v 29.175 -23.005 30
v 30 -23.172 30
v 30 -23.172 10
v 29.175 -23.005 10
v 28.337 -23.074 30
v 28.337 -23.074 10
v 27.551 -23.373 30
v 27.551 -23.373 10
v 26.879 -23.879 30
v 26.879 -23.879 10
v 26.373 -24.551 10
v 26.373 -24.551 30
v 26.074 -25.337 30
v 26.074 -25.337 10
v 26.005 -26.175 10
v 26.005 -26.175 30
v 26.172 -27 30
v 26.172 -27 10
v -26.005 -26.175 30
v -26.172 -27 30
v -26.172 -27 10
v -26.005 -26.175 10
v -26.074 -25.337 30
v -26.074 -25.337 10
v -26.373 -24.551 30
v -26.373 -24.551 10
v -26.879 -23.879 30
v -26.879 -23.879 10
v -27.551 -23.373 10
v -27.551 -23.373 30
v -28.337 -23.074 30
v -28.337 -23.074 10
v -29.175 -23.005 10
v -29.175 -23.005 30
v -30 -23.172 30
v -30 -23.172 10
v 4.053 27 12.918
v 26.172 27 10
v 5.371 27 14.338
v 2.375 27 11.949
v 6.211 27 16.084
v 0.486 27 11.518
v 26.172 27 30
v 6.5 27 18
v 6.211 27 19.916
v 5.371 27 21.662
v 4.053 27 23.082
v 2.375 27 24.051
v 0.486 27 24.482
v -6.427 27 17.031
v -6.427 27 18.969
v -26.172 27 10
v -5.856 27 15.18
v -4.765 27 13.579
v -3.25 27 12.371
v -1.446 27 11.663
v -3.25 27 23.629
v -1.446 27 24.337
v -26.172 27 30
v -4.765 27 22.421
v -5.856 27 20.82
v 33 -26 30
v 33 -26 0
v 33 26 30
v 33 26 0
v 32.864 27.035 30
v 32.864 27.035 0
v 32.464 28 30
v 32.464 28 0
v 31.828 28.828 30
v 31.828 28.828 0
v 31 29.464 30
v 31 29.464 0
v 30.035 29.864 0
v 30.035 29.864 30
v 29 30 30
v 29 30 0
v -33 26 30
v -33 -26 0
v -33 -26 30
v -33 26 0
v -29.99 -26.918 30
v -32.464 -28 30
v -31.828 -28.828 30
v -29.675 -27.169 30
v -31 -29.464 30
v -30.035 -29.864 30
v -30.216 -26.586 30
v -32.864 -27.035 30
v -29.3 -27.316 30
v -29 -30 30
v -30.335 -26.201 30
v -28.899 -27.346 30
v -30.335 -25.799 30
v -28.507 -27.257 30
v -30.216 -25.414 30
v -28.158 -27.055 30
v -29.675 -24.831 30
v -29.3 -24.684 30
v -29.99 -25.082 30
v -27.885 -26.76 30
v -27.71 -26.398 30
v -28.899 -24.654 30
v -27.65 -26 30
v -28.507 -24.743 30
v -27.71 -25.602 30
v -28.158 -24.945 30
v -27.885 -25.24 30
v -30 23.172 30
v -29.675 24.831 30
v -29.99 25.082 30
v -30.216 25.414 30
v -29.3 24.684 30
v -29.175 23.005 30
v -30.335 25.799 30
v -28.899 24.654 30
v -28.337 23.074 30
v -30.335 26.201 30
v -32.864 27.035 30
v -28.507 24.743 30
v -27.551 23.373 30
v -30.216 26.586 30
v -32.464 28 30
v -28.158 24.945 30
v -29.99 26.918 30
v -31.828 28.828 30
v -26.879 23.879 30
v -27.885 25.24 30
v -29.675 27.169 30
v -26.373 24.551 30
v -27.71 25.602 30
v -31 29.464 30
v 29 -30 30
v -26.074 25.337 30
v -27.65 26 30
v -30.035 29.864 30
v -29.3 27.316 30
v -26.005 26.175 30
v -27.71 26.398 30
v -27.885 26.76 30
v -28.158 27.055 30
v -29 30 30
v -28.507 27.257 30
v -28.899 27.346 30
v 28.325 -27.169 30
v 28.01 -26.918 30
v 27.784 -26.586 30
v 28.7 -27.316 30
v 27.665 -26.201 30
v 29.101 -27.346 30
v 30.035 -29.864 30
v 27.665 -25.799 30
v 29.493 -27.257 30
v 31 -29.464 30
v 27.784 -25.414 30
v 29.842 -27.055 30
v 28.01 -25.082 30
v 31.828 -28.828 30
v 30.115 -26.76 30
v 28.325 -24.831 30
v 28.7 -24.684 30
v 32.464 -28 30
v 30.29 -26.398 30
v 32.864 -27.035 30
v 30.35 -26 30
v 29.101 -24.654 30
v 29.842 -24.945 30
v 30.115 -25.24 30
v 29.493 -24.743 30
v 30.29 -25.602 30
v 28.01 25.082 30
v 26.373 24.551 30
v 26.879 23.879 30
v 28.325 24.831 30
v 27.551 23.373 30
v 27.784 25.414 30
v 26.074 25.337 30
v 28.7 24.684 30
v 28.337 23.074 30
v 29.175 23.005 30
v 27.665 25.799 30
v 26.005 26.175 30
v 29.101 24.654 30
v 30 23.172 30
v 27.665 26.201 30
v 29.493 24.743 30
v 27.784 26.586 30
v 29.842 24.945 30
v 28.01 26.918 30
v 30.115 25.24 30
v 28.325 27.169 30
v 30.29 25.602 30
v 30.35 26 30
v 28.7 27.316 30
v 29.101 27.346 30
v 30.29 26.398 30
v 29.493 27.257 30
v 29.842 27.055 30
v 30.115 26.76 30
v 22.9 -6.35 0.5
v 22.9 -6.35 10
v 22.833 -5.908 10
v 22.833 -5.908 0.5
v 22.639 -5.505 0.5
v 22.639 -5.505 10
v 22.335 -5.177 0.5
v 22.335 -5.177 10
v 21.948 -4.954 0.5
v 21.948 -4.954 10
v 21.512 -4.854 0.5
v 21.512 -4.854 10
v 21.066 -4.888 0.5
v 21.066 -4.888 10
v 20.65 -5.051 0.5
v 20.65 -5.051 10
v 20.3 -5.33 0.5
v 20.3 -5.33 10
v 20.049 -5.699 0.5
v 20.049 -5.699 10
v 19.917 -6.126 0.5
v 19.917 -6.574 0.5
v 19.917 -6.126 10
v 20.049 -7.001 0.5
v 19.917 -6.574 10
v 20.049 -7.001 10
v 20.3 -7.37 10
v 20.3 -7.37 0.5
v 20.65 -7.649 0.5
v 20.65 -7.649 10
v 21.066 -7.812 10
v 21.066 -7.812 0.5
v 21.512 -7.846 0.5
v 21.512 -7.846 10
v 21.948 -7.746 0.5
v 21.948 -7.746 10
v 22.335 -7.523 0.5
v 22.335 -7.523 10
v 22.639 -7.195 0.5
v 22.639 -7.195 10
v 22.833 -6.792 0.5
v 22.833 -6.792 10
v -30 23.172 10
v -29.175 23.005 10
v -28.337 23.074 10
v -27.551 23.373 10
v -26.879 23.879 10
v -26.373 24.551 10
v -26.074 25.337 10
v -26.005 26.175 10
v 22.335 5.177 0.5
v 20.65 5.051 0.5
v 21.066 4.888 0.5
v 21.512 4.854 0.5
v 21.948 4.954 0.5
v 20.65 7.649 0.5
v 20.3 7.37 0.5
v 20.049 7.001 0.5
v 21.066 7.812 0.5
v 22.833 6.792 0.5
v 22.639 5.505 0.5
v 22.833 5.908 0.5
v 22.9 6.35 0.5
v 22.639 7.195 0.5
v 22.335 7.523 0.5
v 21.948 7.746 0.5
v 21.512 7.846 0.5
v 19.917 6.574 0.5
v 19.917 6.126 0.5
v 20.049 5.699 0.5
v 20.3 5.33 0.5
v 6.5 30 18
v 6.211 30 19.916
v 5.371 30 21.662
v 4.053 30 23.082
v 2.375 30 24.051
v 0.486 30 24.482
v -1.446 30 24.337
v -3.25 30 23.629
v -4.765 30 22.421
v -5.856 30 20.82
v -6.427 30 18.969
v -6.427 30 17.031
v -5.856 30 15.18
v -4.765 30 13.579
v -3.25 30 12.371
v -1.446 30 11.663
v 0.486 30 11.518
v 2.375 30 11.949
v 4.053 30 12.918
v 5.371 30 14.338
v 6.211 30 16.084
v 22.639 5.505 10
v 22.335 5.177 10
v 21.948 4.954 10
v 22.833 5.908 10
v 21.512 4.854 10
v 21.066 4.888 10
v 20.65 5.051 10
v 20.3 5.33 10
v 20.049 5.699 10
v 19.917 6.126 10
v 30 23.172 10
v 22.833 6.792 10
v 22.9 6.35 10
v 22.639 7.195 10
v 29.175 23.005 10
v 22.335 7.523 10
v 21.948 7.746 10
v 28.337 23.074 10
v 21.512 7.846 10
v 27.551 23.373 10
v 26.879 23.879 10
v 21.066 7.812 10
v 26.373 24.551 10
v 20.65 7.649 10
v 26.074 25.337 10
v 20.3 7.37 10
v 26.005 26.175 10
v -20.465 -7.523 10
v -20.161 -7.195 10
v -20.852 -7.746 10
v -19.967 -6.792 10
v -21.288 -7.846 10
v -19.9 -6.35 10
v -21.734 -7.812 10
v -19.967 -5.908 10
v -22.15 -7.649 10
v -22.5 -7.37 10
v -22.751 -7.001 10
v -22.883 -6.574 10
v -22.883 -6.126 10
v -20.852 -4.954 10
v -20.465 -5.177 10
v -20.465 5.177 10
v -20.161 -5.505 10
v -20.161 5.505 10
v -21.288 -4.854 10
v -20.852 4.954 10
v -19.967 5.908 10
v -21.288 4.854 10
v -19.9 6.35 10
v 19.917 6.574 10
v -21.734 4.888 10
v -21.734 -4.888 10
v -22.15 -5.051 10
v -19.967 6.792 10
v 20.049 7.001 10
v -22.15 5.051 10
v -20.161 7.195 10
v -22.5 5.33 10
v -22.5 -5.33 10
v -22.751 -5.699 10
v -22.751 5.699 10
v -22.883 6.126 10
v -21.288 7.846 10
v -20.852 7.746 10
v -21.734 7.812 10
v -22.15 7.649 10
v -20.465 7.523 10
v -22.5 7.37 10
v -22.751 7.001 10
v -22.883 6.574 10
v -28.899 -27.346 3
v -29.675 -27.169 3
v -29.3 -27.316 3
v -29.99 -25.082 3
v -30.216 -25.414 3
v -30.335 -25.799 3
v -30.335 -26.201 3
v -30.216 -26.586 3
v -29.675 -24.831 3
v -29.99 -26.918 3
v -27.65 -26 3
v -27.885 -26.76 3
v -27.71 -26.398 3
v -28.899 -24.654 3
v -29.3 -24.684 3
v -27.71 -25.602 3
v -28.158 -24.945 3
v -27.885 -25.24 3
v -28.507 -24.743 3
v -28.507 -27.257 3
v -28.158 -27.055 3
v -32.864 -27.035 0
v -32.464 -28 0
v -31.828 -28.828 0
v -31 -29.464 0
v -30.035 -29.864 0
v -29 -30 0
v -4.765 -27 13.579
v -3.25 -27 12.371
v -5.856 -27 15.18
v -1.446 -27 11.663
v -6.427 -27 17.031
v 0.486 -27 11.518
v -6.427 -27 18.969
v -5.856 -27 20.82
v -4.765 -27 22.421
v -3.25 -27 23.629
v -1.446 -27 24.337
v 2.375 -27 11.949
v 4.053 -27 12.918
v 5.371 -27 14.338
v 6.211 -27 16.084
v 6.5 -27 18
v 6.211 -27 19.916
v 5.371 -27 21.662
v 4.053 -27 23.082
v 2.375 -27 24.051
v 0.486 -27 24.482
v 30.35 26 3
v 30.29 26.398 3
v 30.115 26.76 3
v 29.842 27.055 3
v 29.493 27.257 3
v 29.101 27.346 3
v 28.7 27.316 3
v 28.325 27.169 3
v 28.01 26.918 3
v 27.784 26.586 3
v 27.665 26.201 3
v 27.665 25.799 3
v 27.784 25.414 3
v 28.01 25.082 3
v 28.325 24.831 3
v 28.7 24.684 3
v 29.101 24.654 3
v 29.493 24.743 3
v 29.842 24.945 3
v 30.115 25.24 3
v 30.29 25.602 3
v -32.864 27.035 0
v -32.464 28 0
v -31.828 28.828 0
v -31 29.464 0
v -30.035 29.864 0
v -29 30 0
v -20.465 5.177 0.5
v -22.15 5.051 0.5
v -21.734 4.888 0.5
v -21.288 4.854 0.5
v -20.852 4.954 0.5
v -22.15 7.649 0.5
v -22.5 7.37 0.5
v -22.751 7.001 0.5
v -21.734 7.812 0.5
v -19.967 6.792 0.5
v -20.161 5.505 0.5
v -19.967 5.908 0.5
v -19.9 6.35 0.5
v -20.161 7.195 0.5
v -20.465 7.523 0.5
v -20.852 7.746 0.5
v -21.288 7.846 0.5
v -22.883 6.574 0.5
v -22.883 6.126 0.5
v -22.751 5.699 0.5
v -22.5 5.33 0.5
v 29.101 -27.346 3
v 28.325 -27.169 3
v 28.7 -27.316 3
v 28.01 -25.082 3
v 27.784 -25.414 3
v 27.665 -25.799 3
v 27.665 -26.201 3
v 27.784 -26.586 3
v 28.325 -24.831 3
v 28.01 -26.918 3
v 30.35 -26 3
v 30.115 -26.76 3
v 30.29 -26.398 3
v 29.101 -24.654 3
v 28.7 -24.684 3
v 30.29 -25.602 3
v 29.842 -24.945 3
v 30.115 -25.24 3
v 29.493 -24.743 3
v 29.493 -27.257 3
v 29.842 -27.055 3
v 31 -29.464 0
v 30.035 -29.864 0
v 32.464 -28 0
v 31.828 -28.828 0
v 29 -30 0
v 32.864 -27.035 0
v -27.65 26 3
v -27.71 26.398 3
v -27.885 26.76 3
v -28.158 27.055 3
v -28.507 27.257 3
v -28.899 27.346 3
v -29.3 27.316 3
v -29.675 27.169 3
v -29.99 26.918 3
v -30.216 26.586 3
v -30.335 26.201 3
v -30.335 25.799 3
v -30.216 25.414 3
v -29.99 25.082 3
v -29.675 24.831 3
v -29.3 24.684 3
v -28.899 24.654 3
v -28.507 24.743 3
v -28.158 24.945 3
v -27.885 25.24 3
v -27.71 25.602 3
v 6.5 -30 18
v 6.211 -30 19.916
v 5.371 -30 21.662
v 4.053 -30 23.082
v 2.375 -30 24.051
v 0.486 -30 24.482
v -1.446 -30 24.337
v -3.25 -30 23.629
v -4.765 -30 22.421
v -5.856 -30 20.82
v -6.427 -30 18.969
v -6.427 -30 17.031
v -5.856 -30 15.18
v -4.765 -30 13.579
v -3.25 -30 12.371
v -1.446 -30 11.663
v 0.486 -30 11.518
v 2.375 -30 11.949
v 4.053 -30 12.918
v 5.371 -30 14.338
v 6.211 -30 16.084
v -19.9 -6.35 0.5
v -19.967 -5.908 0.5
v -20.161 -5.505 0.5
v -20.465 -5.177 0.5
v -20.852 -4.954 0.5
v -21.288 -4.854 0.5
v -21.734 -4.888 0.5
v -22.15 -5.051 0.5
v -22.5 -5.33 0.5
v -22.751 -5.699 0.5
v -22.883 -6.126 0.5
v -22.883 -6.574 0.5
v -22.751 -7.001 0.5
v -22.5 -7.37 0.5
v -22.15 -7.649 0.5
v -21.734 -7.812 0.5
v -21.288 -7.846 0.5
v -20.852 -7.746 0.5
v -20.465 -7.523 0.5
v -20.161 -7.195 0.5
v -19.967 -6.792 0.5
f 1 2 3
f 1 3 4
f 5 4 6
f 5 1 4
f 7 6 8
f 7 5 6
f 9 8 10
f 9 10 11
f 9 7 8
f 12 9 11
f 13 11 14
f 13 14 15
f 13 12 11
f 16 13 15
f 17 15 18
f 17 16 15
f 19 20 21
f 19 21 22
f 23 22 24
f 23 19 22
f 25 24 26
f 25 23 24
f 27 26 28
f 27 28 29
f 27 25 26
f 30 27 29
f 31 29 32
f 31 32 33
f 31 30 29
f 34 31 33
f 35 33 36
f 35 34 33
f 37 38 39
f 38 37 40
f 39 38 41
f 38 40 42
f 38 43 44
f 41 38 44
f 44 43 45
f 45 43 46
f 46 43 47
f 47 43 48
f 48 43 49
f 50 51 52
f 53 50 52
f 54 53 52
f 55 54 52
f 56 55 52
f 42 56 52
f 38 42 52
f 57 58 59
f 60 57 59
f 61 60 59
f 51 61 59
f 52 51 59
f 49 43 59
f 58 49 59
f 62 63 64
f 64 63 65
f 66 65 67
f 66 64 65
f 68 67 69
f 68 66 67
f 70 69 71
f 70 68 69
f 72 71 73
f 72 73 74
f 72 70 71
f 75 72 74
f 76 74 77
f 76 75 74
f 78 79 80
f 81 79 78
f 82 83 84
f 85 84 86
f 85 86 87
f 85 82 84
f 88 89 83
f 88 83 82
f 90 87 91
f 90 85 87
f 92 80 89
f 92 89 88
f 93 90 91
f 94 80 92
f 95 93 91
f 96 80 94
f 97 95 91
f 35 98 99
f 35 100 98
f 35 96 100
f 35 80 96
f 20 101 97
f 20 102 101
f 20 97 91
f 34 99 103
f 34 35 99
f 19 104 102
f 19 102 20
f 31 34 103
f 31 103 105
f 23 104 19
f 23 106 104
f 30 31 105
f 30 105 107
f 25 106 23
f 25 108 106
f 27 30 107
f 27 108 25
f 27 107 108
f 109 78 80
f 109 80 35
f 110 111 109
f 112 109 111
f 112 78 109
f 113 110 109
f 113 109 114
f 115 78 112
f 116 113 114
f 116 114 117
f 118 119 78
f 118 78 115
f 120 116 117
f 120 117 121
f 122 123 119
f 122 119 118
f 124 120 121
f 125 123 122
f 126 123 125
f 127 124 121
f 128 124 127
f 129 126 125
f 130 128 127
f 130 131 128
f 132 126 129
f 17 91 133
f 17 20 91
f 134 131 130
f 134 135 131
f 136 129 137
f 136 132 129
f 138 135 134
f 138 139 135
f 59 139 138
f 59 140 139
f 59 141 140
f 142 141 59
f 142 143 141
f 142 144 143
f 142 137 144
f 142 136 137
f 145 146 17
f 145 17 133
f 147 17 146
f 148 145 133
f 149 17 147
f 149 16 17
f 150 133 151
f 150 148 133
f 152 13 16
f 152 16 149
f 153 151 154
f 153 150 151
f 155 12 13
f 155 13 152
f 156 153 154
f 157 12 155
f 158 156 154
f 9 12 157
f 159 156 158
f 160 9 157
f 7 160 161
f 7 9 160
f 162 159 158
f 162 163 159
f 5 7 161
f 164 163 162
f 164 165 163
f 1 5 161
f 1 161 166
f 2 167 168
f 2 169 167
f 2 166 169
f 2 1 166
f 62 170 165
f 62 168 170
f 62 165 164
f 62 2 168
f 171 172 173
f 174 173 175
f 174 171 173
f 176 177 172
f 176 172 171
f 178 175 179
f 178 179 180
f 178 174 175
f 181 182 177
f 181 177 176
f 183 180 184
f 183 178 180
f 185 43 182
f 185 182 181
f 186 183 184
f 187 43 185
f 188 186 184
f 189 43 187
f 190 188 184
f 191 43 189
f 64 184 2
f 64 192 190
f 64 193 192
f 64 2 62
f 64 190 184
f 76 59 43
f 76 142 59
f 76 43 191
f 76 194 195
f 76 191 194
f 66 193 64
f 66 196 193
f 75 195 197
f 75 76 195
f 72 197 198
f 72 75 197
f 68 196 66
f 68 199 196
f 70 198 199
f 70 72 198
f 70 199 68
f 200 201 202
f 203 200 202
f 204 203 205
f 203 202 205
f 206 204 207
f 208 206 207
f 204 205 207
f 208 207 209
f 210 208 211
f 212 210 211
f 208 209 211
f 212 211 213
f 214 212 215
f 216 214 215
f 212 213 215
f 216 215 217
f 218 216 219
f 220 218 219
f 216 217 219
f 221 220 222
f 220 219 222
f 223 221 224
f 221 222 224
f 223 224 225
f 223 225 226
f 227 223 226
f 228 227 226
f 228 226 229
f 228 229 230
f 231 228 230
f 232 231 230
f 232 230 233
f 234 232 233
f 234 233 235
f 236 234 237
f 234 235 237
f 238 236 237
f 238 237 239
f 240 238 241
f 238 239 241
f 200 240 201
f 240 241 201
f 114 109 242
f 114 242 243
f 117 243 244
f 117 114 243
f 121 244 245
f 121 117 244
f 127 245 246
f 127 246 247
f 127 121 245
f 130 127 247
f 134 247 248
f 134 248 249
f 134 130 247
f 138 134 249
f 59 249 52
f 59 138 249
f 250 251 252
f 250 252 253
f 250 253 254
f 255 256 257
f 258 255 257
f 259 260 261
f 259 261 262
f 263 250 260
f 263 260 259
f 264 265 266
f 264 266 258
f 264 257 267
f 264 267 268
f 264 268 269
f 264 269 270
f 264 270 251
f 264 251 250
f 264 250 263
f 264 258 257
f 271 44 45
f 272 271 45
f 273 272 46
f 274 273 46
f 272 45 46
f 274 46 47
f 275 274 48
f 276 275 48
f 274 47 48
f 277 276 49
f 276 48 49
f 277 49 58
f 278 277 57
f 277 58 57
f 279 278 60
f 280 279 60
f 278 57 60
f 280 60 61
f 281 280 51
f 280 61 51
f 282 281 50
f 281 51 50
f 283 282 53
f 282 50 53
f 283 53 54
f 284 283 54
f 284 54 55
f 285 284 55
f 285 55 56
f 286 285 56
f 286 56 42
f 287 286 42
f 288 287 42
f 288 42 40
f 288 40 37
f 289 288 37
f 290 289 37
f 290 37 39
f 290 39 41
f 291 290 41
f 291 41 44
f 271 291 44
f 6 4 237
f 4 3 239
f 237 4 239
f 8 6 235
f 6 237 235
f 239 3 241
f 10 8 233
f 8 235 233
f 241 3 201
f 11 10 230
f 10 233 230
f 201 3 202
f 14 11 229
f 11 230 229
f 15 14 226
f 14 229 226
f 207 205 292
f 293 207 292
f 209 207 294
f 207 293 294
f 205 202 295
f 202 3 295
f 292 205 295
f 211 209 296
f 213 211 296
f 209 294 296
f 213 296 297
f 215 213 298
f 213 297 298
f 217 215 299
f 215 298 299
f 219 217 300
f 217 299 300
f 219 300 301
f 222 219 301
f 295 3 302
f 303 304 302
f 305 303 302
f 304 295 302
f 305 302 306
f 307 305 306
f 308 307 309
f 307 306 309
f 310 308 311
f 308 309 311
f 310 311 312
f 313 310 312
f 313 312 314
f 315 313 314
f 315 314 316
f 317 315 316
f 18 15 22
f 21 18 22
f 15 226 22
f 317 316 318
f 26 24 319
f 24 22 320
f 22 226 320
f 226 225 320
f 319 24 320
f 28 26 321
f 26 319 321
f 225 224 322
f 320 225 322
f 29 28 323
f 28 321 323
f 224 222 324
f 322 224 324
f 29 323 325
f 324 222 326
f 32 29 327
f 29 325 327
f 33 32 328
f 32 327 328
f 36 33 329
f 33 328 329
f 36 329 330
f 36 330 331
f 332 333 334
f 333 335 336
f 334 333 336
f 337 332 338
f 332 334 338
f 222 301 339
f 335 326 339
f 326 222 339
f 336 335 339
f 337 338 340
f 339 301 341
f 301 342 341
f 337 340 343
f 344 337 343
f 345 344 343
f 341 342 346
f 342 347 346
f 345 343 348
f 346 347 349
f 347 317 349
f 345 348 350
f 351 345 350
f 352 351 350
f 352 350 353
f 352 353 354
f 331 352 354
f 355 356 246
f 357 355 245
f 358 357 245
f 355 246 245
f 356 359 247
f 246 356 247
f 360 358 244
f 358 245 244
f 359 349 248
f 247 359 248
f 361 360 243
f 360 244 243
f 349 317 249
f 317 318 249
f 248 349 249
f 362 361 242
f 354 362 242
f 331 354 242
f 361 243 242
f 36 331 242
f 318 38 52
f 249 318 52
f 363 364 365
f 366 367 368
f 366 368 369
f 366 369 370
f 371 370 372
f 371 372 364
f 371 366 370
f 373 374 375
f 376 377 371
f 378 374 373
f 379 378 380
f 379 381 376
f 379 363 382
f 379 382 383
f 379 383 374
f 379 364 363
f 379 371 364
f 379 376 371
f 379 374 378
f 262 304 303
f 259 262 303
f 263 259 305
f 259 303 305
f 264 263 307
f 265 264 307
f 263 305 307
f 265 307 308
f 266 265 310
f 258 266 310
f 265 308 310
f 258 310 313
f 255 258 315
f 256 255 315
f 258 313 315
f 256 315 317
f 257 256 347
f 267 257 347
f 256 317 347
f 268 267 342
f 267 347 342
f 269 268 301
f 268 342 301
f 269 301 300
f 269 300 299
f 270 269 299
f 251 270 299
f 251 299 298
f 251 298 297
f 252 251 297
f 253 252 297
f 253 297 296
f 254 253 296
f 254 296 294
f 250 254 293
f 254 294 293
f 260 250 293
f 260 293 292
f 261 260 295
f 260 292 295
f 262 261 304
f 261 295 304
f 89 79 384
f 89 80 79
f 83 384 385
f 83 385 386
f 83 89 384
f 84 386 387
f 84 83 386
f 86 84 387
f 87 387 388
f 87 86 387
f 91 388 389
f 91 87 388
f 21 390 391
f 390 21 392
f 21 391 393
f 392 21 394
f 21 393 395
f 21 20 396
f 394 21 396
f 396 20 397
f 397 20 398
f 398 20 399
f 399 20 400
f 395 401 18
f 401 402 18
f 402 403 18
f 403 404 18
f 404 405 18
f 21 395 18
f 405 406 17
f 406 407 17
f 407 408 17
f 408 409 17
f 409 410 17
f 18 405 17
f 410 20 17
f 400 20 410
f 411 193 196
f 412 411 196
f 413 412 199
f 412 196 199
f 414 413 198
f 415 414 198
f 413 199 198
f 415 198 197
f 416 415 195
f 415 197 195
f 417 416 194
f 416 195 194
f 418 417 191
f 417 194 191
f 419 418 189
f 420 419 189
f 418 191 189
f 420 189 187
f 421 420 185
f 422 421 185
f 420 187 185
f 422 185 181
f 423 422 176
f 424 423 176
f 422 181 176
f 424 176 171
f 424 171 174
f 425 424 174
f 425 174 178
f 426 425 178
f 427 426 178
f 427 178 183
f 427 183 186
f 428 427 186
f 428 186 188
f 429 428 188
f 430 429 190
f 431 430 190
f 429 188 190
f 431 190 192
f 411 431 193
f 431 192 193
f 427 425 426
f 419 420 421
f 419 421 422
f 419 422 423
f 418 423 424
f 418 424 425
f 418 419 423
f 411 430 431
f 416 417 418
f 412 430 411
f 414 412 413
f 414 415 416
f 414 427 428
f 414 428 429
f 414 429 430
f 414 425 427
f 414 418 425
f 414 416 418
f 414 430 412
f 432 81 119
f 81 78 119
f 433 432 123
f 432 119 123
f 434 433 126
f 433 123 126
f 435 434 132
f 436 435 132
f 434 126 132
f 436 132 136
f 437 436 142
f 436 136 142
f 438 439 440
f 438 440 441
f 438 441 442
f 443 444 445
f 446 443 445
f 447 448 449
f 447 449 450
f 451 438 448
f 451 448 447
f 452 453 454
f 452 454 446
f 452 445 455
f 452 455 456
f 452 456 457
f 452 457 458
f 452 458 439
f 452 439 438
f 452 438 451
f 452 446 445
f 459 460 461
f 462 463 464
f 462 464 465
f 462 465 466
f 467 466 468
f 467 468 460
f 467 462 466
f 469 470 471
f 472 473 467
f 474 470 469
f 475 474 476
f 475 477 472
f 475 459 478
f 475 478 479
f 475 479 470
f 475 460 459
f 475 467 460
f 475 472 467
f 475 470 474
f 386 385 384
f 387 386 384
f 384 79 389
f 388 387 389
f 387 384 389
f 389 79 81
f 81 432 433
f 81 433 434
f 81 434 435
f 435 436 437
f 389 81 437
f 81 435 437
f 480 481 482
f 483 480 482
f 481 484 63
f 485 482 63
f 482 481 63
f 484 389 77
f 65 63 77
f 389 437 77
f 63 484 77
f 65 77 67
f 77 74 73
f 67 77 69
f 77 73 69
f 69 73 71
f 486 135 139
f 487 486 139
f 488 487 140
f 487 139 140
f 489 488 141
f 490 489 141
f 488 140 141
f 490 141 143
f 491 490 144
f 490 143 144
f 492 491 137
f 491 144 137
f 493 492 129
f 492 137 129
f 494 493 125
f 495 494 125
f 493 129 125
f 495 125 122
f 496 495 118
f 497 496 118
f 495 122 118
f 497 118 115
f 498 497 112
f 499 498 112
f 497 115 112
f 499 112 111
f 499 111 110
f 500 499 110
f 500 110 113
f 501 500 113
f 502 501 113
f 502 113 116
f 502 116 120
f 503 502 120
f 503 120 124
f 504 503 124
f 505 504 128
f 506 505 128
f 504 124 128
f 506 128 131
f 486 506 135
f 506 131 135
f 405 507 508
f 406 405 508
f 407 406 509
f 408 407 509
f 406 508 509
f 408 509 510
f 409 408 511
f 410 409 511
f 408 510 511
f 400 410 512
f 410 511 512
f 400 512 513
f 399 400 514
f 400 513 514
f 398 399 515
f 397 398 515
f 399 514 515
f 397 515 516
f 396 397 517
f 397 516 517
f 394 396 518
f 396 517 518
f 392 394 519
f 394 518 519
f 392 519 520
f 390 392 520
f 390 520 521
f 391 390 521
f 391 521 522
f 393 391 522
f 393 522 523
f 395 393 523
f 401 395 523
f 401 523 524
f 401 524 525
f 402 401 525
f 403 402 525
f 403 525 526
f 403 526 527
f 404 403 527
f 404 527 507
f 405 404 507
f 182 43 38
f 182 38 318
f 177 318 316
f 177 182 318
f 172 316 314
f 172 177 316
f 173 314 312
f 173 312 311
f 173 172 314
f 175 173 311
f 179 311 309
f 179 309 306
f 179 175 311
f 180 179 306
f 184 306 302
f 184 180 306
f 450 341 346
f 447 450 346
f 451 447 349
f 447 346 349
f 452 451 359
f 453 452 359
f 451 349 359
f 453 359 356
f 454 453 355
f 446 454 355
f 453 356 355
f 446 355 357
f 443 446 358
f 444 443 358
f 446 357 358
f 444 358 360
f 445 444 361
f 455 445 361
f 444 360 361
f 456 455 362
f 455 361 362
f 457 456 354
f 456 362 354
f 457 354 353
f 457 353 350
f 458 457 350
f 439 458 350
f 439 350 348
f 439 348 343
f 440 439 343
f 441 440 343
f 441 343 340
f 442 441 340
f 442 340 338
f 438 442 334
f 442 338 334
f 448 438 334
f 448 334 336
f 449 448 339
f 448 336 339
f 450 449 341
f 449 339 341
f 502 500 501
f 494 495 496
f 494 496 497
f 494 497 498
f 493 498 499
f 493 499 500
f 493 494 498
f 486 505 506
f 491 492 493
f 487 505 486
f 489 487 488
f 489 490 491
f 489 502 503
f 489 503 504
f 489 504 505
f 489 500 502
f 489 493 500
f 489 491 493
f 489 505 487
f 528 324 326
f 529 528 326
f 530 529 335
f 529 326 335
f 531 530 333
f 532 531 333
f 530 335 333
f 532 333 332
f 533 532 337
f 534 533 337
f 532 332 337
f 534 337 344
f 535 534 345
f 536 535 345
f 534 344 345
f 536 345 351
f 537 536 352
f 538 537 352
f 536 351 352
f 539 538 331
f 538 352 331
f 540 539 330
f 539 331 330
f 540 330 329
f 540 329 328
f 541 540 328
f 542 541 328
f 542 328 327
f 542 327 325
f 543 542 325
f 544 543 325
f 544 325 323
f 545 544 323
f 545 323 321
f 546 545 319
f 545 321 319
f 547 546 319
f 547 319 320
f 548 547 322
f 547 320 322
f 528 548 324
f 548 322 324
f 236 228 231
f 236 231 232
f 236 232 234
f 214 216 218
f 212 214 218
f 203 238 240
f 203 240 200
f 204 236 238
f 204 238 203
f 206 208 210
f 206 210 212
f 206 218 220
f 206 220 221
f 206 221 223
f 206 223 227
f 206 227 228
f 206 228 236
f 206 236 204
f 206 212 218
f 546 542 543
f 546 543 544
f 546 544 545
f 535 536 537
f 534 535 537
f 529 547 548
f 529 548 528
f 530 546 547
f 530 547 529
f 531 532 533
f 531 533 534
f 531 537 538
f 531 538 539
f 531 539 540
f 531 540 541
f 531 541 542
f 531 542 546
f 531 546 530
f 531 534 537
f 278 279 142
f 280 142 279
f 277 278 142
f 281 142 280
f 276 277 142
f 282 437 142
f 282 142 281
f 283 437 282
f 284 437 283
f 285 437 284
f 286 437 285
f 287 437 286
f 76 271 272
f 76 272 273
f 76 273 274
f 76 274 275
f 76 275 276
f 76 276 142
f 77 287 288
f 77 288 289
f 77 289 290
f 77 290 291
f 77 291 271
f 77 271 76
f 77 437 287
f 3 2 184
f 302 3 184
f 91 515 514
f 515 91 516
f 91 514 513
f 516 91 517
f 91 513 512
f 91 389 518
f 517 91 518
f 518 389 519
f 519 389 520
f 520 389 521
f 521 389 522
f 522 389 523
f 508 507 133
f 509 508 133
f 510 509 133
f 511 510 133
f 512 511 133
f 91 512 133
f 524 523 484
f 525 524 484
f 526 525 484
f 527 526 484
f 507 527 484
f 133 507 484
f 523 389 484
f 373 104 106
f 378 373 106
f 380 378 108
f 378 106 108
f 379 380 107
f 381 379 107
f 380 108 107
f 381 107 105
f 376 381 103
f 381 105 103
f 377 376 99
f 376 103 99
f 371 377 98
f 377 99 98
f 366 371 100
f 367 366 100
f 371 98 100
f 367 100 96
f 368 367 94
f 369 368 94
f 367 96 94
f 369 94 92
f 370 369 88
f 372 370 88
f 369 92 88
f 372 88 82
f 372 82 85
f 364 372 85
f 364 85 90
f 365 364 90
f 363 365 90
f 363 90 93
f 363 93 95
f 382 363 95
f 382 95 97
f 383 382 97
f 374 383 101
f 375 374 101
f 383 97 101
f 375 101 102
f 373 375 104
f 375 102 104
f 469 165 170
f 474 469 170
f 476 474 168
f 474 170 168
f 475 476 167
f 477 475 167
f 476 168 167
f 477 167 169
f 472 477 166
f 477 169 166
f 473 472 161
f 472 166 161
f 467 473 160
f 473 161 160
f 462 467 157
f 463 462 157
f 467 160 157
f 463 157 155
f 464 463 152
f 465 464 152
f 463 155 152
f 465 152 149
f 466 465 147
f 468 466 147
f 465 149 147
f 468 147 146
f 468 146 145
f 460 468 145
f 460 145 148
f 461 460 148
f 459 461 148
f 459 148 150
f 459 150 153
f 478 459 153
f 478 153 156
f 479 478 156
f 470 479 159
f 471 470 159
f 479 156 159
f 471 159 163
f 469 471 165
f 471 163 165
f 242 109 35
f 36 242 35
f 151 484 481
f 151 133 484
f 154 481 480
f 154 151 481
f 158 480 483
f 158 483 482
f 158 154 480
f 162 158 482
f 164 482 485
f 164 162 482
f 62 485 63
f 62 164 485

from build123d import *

# Parameters (mm, degrees)
SKETCH_W        = 66
SKETCH_H        = 60
PAD_DEPTH       = 30
FILLET_R        = 4
SKETCH001_R     = 1.35
POCKET_DEPTH    = 27
POCKET001_DEPTH = 20
SKETCH003_R     = 1.5
POCKET002_DEPTH = 9.5
SKETCH004_R     = 6.5
POCKET003_DEPTH = 60.001


with BuildPart() as part:
    # Sketch → Pad (new body)
    with BuildSketch(Plane.XY):
        Rectangle(SKETCH_W, SKETCH_H)
    extrude(amount=PAD_DEPTH)

    # Fillet
    fillet_edges = [part.edges().sort_by_distance(p)[0] for p in [
        (-33, -30, 15),
        (33, -30, 15),
        (33, 30, 15),
        (-33, 30, 15),
    ]]
    fillet(fillet_edges, radius=FILLET_R)

    # Sketch001 (on Face5 of Fillet) → Pocket (cut)
    with BuildSketch(Plane.XY.offset(30)):
        with Locations((-29, 26)):
            Circle(SKETCH001_R)
        with Locations((29, 26)):
            Circle(SKETCH001_R)
        with Locations((29, -26)):
            Circle(SKETCH001_R)
        with Locations((-29, -26)):
            Circle(SKETCH001_R)
    extrude(amount=-POCKET_DEPTH, mode=Mode.SUBTRACT)

    # Sketch002 (on Face5 of Pocket) → Pocket001 (cut)
    with BuildSketch(Plane.XY.offset(30)):
        with BuildLine():
            ThreePointArc((-30, 23.171573), (-26.87868, 23.87868), (-26.171573, 27))
            Line((26.171573, 27), (-26.171573, 27))
            ThreePointArc((26.171573, 27), (26.87868, 23.87868), (30, 23.171573))
            Line((30, -23.171573), (30, 23.171573))
            ThreePointArc((30, -23.171573), (26.87868, -23.87868), (26.171573, -27))
            Line((-26.171573, -27), (26.171573, -27))
            ThreePointArc((-26.171573, -27), (-26.87868, -23.87868), (-30, -23.171573))
            Line((-30, 23.171573), (-30, -23.171573))
        make_face()
    extrude(amount=-POCKET001_DEPTH, mode=Mode.SUBTRACT)

    # Sketch003 (on Face26 of Pocket001) → Pocket002 (cut)
    with BuildSketch(Plane.XY.offset(10)):
        with Locations((-21.4, 6.35)):
            Circle(SKETCH003_R)
        with Locations((21.4, 6.35)):
            Circle(SKETCH003_R)
        with Locations((21.4, -6.35)):
            Circle(SKETCH003_R)
        with Locations((-21.4, -6.35)):
            Circle(SKETCH003_R)
    extrude(amount=-POCKET002_DEPTH, mode=Mode.SUBTRACT)

    # Sketch004 (on Face6 of Pocket002) → Pocket003 (cut, through all)
    with BuildSketch(Plane.XZ.offset(30)):
        with Locations((0, 18)):
            Circle(SKETCH004_R)
    extrude(amount=-POCKET003_DEPTH, mode=Mode.SUBTRACT)


solid = part.part
